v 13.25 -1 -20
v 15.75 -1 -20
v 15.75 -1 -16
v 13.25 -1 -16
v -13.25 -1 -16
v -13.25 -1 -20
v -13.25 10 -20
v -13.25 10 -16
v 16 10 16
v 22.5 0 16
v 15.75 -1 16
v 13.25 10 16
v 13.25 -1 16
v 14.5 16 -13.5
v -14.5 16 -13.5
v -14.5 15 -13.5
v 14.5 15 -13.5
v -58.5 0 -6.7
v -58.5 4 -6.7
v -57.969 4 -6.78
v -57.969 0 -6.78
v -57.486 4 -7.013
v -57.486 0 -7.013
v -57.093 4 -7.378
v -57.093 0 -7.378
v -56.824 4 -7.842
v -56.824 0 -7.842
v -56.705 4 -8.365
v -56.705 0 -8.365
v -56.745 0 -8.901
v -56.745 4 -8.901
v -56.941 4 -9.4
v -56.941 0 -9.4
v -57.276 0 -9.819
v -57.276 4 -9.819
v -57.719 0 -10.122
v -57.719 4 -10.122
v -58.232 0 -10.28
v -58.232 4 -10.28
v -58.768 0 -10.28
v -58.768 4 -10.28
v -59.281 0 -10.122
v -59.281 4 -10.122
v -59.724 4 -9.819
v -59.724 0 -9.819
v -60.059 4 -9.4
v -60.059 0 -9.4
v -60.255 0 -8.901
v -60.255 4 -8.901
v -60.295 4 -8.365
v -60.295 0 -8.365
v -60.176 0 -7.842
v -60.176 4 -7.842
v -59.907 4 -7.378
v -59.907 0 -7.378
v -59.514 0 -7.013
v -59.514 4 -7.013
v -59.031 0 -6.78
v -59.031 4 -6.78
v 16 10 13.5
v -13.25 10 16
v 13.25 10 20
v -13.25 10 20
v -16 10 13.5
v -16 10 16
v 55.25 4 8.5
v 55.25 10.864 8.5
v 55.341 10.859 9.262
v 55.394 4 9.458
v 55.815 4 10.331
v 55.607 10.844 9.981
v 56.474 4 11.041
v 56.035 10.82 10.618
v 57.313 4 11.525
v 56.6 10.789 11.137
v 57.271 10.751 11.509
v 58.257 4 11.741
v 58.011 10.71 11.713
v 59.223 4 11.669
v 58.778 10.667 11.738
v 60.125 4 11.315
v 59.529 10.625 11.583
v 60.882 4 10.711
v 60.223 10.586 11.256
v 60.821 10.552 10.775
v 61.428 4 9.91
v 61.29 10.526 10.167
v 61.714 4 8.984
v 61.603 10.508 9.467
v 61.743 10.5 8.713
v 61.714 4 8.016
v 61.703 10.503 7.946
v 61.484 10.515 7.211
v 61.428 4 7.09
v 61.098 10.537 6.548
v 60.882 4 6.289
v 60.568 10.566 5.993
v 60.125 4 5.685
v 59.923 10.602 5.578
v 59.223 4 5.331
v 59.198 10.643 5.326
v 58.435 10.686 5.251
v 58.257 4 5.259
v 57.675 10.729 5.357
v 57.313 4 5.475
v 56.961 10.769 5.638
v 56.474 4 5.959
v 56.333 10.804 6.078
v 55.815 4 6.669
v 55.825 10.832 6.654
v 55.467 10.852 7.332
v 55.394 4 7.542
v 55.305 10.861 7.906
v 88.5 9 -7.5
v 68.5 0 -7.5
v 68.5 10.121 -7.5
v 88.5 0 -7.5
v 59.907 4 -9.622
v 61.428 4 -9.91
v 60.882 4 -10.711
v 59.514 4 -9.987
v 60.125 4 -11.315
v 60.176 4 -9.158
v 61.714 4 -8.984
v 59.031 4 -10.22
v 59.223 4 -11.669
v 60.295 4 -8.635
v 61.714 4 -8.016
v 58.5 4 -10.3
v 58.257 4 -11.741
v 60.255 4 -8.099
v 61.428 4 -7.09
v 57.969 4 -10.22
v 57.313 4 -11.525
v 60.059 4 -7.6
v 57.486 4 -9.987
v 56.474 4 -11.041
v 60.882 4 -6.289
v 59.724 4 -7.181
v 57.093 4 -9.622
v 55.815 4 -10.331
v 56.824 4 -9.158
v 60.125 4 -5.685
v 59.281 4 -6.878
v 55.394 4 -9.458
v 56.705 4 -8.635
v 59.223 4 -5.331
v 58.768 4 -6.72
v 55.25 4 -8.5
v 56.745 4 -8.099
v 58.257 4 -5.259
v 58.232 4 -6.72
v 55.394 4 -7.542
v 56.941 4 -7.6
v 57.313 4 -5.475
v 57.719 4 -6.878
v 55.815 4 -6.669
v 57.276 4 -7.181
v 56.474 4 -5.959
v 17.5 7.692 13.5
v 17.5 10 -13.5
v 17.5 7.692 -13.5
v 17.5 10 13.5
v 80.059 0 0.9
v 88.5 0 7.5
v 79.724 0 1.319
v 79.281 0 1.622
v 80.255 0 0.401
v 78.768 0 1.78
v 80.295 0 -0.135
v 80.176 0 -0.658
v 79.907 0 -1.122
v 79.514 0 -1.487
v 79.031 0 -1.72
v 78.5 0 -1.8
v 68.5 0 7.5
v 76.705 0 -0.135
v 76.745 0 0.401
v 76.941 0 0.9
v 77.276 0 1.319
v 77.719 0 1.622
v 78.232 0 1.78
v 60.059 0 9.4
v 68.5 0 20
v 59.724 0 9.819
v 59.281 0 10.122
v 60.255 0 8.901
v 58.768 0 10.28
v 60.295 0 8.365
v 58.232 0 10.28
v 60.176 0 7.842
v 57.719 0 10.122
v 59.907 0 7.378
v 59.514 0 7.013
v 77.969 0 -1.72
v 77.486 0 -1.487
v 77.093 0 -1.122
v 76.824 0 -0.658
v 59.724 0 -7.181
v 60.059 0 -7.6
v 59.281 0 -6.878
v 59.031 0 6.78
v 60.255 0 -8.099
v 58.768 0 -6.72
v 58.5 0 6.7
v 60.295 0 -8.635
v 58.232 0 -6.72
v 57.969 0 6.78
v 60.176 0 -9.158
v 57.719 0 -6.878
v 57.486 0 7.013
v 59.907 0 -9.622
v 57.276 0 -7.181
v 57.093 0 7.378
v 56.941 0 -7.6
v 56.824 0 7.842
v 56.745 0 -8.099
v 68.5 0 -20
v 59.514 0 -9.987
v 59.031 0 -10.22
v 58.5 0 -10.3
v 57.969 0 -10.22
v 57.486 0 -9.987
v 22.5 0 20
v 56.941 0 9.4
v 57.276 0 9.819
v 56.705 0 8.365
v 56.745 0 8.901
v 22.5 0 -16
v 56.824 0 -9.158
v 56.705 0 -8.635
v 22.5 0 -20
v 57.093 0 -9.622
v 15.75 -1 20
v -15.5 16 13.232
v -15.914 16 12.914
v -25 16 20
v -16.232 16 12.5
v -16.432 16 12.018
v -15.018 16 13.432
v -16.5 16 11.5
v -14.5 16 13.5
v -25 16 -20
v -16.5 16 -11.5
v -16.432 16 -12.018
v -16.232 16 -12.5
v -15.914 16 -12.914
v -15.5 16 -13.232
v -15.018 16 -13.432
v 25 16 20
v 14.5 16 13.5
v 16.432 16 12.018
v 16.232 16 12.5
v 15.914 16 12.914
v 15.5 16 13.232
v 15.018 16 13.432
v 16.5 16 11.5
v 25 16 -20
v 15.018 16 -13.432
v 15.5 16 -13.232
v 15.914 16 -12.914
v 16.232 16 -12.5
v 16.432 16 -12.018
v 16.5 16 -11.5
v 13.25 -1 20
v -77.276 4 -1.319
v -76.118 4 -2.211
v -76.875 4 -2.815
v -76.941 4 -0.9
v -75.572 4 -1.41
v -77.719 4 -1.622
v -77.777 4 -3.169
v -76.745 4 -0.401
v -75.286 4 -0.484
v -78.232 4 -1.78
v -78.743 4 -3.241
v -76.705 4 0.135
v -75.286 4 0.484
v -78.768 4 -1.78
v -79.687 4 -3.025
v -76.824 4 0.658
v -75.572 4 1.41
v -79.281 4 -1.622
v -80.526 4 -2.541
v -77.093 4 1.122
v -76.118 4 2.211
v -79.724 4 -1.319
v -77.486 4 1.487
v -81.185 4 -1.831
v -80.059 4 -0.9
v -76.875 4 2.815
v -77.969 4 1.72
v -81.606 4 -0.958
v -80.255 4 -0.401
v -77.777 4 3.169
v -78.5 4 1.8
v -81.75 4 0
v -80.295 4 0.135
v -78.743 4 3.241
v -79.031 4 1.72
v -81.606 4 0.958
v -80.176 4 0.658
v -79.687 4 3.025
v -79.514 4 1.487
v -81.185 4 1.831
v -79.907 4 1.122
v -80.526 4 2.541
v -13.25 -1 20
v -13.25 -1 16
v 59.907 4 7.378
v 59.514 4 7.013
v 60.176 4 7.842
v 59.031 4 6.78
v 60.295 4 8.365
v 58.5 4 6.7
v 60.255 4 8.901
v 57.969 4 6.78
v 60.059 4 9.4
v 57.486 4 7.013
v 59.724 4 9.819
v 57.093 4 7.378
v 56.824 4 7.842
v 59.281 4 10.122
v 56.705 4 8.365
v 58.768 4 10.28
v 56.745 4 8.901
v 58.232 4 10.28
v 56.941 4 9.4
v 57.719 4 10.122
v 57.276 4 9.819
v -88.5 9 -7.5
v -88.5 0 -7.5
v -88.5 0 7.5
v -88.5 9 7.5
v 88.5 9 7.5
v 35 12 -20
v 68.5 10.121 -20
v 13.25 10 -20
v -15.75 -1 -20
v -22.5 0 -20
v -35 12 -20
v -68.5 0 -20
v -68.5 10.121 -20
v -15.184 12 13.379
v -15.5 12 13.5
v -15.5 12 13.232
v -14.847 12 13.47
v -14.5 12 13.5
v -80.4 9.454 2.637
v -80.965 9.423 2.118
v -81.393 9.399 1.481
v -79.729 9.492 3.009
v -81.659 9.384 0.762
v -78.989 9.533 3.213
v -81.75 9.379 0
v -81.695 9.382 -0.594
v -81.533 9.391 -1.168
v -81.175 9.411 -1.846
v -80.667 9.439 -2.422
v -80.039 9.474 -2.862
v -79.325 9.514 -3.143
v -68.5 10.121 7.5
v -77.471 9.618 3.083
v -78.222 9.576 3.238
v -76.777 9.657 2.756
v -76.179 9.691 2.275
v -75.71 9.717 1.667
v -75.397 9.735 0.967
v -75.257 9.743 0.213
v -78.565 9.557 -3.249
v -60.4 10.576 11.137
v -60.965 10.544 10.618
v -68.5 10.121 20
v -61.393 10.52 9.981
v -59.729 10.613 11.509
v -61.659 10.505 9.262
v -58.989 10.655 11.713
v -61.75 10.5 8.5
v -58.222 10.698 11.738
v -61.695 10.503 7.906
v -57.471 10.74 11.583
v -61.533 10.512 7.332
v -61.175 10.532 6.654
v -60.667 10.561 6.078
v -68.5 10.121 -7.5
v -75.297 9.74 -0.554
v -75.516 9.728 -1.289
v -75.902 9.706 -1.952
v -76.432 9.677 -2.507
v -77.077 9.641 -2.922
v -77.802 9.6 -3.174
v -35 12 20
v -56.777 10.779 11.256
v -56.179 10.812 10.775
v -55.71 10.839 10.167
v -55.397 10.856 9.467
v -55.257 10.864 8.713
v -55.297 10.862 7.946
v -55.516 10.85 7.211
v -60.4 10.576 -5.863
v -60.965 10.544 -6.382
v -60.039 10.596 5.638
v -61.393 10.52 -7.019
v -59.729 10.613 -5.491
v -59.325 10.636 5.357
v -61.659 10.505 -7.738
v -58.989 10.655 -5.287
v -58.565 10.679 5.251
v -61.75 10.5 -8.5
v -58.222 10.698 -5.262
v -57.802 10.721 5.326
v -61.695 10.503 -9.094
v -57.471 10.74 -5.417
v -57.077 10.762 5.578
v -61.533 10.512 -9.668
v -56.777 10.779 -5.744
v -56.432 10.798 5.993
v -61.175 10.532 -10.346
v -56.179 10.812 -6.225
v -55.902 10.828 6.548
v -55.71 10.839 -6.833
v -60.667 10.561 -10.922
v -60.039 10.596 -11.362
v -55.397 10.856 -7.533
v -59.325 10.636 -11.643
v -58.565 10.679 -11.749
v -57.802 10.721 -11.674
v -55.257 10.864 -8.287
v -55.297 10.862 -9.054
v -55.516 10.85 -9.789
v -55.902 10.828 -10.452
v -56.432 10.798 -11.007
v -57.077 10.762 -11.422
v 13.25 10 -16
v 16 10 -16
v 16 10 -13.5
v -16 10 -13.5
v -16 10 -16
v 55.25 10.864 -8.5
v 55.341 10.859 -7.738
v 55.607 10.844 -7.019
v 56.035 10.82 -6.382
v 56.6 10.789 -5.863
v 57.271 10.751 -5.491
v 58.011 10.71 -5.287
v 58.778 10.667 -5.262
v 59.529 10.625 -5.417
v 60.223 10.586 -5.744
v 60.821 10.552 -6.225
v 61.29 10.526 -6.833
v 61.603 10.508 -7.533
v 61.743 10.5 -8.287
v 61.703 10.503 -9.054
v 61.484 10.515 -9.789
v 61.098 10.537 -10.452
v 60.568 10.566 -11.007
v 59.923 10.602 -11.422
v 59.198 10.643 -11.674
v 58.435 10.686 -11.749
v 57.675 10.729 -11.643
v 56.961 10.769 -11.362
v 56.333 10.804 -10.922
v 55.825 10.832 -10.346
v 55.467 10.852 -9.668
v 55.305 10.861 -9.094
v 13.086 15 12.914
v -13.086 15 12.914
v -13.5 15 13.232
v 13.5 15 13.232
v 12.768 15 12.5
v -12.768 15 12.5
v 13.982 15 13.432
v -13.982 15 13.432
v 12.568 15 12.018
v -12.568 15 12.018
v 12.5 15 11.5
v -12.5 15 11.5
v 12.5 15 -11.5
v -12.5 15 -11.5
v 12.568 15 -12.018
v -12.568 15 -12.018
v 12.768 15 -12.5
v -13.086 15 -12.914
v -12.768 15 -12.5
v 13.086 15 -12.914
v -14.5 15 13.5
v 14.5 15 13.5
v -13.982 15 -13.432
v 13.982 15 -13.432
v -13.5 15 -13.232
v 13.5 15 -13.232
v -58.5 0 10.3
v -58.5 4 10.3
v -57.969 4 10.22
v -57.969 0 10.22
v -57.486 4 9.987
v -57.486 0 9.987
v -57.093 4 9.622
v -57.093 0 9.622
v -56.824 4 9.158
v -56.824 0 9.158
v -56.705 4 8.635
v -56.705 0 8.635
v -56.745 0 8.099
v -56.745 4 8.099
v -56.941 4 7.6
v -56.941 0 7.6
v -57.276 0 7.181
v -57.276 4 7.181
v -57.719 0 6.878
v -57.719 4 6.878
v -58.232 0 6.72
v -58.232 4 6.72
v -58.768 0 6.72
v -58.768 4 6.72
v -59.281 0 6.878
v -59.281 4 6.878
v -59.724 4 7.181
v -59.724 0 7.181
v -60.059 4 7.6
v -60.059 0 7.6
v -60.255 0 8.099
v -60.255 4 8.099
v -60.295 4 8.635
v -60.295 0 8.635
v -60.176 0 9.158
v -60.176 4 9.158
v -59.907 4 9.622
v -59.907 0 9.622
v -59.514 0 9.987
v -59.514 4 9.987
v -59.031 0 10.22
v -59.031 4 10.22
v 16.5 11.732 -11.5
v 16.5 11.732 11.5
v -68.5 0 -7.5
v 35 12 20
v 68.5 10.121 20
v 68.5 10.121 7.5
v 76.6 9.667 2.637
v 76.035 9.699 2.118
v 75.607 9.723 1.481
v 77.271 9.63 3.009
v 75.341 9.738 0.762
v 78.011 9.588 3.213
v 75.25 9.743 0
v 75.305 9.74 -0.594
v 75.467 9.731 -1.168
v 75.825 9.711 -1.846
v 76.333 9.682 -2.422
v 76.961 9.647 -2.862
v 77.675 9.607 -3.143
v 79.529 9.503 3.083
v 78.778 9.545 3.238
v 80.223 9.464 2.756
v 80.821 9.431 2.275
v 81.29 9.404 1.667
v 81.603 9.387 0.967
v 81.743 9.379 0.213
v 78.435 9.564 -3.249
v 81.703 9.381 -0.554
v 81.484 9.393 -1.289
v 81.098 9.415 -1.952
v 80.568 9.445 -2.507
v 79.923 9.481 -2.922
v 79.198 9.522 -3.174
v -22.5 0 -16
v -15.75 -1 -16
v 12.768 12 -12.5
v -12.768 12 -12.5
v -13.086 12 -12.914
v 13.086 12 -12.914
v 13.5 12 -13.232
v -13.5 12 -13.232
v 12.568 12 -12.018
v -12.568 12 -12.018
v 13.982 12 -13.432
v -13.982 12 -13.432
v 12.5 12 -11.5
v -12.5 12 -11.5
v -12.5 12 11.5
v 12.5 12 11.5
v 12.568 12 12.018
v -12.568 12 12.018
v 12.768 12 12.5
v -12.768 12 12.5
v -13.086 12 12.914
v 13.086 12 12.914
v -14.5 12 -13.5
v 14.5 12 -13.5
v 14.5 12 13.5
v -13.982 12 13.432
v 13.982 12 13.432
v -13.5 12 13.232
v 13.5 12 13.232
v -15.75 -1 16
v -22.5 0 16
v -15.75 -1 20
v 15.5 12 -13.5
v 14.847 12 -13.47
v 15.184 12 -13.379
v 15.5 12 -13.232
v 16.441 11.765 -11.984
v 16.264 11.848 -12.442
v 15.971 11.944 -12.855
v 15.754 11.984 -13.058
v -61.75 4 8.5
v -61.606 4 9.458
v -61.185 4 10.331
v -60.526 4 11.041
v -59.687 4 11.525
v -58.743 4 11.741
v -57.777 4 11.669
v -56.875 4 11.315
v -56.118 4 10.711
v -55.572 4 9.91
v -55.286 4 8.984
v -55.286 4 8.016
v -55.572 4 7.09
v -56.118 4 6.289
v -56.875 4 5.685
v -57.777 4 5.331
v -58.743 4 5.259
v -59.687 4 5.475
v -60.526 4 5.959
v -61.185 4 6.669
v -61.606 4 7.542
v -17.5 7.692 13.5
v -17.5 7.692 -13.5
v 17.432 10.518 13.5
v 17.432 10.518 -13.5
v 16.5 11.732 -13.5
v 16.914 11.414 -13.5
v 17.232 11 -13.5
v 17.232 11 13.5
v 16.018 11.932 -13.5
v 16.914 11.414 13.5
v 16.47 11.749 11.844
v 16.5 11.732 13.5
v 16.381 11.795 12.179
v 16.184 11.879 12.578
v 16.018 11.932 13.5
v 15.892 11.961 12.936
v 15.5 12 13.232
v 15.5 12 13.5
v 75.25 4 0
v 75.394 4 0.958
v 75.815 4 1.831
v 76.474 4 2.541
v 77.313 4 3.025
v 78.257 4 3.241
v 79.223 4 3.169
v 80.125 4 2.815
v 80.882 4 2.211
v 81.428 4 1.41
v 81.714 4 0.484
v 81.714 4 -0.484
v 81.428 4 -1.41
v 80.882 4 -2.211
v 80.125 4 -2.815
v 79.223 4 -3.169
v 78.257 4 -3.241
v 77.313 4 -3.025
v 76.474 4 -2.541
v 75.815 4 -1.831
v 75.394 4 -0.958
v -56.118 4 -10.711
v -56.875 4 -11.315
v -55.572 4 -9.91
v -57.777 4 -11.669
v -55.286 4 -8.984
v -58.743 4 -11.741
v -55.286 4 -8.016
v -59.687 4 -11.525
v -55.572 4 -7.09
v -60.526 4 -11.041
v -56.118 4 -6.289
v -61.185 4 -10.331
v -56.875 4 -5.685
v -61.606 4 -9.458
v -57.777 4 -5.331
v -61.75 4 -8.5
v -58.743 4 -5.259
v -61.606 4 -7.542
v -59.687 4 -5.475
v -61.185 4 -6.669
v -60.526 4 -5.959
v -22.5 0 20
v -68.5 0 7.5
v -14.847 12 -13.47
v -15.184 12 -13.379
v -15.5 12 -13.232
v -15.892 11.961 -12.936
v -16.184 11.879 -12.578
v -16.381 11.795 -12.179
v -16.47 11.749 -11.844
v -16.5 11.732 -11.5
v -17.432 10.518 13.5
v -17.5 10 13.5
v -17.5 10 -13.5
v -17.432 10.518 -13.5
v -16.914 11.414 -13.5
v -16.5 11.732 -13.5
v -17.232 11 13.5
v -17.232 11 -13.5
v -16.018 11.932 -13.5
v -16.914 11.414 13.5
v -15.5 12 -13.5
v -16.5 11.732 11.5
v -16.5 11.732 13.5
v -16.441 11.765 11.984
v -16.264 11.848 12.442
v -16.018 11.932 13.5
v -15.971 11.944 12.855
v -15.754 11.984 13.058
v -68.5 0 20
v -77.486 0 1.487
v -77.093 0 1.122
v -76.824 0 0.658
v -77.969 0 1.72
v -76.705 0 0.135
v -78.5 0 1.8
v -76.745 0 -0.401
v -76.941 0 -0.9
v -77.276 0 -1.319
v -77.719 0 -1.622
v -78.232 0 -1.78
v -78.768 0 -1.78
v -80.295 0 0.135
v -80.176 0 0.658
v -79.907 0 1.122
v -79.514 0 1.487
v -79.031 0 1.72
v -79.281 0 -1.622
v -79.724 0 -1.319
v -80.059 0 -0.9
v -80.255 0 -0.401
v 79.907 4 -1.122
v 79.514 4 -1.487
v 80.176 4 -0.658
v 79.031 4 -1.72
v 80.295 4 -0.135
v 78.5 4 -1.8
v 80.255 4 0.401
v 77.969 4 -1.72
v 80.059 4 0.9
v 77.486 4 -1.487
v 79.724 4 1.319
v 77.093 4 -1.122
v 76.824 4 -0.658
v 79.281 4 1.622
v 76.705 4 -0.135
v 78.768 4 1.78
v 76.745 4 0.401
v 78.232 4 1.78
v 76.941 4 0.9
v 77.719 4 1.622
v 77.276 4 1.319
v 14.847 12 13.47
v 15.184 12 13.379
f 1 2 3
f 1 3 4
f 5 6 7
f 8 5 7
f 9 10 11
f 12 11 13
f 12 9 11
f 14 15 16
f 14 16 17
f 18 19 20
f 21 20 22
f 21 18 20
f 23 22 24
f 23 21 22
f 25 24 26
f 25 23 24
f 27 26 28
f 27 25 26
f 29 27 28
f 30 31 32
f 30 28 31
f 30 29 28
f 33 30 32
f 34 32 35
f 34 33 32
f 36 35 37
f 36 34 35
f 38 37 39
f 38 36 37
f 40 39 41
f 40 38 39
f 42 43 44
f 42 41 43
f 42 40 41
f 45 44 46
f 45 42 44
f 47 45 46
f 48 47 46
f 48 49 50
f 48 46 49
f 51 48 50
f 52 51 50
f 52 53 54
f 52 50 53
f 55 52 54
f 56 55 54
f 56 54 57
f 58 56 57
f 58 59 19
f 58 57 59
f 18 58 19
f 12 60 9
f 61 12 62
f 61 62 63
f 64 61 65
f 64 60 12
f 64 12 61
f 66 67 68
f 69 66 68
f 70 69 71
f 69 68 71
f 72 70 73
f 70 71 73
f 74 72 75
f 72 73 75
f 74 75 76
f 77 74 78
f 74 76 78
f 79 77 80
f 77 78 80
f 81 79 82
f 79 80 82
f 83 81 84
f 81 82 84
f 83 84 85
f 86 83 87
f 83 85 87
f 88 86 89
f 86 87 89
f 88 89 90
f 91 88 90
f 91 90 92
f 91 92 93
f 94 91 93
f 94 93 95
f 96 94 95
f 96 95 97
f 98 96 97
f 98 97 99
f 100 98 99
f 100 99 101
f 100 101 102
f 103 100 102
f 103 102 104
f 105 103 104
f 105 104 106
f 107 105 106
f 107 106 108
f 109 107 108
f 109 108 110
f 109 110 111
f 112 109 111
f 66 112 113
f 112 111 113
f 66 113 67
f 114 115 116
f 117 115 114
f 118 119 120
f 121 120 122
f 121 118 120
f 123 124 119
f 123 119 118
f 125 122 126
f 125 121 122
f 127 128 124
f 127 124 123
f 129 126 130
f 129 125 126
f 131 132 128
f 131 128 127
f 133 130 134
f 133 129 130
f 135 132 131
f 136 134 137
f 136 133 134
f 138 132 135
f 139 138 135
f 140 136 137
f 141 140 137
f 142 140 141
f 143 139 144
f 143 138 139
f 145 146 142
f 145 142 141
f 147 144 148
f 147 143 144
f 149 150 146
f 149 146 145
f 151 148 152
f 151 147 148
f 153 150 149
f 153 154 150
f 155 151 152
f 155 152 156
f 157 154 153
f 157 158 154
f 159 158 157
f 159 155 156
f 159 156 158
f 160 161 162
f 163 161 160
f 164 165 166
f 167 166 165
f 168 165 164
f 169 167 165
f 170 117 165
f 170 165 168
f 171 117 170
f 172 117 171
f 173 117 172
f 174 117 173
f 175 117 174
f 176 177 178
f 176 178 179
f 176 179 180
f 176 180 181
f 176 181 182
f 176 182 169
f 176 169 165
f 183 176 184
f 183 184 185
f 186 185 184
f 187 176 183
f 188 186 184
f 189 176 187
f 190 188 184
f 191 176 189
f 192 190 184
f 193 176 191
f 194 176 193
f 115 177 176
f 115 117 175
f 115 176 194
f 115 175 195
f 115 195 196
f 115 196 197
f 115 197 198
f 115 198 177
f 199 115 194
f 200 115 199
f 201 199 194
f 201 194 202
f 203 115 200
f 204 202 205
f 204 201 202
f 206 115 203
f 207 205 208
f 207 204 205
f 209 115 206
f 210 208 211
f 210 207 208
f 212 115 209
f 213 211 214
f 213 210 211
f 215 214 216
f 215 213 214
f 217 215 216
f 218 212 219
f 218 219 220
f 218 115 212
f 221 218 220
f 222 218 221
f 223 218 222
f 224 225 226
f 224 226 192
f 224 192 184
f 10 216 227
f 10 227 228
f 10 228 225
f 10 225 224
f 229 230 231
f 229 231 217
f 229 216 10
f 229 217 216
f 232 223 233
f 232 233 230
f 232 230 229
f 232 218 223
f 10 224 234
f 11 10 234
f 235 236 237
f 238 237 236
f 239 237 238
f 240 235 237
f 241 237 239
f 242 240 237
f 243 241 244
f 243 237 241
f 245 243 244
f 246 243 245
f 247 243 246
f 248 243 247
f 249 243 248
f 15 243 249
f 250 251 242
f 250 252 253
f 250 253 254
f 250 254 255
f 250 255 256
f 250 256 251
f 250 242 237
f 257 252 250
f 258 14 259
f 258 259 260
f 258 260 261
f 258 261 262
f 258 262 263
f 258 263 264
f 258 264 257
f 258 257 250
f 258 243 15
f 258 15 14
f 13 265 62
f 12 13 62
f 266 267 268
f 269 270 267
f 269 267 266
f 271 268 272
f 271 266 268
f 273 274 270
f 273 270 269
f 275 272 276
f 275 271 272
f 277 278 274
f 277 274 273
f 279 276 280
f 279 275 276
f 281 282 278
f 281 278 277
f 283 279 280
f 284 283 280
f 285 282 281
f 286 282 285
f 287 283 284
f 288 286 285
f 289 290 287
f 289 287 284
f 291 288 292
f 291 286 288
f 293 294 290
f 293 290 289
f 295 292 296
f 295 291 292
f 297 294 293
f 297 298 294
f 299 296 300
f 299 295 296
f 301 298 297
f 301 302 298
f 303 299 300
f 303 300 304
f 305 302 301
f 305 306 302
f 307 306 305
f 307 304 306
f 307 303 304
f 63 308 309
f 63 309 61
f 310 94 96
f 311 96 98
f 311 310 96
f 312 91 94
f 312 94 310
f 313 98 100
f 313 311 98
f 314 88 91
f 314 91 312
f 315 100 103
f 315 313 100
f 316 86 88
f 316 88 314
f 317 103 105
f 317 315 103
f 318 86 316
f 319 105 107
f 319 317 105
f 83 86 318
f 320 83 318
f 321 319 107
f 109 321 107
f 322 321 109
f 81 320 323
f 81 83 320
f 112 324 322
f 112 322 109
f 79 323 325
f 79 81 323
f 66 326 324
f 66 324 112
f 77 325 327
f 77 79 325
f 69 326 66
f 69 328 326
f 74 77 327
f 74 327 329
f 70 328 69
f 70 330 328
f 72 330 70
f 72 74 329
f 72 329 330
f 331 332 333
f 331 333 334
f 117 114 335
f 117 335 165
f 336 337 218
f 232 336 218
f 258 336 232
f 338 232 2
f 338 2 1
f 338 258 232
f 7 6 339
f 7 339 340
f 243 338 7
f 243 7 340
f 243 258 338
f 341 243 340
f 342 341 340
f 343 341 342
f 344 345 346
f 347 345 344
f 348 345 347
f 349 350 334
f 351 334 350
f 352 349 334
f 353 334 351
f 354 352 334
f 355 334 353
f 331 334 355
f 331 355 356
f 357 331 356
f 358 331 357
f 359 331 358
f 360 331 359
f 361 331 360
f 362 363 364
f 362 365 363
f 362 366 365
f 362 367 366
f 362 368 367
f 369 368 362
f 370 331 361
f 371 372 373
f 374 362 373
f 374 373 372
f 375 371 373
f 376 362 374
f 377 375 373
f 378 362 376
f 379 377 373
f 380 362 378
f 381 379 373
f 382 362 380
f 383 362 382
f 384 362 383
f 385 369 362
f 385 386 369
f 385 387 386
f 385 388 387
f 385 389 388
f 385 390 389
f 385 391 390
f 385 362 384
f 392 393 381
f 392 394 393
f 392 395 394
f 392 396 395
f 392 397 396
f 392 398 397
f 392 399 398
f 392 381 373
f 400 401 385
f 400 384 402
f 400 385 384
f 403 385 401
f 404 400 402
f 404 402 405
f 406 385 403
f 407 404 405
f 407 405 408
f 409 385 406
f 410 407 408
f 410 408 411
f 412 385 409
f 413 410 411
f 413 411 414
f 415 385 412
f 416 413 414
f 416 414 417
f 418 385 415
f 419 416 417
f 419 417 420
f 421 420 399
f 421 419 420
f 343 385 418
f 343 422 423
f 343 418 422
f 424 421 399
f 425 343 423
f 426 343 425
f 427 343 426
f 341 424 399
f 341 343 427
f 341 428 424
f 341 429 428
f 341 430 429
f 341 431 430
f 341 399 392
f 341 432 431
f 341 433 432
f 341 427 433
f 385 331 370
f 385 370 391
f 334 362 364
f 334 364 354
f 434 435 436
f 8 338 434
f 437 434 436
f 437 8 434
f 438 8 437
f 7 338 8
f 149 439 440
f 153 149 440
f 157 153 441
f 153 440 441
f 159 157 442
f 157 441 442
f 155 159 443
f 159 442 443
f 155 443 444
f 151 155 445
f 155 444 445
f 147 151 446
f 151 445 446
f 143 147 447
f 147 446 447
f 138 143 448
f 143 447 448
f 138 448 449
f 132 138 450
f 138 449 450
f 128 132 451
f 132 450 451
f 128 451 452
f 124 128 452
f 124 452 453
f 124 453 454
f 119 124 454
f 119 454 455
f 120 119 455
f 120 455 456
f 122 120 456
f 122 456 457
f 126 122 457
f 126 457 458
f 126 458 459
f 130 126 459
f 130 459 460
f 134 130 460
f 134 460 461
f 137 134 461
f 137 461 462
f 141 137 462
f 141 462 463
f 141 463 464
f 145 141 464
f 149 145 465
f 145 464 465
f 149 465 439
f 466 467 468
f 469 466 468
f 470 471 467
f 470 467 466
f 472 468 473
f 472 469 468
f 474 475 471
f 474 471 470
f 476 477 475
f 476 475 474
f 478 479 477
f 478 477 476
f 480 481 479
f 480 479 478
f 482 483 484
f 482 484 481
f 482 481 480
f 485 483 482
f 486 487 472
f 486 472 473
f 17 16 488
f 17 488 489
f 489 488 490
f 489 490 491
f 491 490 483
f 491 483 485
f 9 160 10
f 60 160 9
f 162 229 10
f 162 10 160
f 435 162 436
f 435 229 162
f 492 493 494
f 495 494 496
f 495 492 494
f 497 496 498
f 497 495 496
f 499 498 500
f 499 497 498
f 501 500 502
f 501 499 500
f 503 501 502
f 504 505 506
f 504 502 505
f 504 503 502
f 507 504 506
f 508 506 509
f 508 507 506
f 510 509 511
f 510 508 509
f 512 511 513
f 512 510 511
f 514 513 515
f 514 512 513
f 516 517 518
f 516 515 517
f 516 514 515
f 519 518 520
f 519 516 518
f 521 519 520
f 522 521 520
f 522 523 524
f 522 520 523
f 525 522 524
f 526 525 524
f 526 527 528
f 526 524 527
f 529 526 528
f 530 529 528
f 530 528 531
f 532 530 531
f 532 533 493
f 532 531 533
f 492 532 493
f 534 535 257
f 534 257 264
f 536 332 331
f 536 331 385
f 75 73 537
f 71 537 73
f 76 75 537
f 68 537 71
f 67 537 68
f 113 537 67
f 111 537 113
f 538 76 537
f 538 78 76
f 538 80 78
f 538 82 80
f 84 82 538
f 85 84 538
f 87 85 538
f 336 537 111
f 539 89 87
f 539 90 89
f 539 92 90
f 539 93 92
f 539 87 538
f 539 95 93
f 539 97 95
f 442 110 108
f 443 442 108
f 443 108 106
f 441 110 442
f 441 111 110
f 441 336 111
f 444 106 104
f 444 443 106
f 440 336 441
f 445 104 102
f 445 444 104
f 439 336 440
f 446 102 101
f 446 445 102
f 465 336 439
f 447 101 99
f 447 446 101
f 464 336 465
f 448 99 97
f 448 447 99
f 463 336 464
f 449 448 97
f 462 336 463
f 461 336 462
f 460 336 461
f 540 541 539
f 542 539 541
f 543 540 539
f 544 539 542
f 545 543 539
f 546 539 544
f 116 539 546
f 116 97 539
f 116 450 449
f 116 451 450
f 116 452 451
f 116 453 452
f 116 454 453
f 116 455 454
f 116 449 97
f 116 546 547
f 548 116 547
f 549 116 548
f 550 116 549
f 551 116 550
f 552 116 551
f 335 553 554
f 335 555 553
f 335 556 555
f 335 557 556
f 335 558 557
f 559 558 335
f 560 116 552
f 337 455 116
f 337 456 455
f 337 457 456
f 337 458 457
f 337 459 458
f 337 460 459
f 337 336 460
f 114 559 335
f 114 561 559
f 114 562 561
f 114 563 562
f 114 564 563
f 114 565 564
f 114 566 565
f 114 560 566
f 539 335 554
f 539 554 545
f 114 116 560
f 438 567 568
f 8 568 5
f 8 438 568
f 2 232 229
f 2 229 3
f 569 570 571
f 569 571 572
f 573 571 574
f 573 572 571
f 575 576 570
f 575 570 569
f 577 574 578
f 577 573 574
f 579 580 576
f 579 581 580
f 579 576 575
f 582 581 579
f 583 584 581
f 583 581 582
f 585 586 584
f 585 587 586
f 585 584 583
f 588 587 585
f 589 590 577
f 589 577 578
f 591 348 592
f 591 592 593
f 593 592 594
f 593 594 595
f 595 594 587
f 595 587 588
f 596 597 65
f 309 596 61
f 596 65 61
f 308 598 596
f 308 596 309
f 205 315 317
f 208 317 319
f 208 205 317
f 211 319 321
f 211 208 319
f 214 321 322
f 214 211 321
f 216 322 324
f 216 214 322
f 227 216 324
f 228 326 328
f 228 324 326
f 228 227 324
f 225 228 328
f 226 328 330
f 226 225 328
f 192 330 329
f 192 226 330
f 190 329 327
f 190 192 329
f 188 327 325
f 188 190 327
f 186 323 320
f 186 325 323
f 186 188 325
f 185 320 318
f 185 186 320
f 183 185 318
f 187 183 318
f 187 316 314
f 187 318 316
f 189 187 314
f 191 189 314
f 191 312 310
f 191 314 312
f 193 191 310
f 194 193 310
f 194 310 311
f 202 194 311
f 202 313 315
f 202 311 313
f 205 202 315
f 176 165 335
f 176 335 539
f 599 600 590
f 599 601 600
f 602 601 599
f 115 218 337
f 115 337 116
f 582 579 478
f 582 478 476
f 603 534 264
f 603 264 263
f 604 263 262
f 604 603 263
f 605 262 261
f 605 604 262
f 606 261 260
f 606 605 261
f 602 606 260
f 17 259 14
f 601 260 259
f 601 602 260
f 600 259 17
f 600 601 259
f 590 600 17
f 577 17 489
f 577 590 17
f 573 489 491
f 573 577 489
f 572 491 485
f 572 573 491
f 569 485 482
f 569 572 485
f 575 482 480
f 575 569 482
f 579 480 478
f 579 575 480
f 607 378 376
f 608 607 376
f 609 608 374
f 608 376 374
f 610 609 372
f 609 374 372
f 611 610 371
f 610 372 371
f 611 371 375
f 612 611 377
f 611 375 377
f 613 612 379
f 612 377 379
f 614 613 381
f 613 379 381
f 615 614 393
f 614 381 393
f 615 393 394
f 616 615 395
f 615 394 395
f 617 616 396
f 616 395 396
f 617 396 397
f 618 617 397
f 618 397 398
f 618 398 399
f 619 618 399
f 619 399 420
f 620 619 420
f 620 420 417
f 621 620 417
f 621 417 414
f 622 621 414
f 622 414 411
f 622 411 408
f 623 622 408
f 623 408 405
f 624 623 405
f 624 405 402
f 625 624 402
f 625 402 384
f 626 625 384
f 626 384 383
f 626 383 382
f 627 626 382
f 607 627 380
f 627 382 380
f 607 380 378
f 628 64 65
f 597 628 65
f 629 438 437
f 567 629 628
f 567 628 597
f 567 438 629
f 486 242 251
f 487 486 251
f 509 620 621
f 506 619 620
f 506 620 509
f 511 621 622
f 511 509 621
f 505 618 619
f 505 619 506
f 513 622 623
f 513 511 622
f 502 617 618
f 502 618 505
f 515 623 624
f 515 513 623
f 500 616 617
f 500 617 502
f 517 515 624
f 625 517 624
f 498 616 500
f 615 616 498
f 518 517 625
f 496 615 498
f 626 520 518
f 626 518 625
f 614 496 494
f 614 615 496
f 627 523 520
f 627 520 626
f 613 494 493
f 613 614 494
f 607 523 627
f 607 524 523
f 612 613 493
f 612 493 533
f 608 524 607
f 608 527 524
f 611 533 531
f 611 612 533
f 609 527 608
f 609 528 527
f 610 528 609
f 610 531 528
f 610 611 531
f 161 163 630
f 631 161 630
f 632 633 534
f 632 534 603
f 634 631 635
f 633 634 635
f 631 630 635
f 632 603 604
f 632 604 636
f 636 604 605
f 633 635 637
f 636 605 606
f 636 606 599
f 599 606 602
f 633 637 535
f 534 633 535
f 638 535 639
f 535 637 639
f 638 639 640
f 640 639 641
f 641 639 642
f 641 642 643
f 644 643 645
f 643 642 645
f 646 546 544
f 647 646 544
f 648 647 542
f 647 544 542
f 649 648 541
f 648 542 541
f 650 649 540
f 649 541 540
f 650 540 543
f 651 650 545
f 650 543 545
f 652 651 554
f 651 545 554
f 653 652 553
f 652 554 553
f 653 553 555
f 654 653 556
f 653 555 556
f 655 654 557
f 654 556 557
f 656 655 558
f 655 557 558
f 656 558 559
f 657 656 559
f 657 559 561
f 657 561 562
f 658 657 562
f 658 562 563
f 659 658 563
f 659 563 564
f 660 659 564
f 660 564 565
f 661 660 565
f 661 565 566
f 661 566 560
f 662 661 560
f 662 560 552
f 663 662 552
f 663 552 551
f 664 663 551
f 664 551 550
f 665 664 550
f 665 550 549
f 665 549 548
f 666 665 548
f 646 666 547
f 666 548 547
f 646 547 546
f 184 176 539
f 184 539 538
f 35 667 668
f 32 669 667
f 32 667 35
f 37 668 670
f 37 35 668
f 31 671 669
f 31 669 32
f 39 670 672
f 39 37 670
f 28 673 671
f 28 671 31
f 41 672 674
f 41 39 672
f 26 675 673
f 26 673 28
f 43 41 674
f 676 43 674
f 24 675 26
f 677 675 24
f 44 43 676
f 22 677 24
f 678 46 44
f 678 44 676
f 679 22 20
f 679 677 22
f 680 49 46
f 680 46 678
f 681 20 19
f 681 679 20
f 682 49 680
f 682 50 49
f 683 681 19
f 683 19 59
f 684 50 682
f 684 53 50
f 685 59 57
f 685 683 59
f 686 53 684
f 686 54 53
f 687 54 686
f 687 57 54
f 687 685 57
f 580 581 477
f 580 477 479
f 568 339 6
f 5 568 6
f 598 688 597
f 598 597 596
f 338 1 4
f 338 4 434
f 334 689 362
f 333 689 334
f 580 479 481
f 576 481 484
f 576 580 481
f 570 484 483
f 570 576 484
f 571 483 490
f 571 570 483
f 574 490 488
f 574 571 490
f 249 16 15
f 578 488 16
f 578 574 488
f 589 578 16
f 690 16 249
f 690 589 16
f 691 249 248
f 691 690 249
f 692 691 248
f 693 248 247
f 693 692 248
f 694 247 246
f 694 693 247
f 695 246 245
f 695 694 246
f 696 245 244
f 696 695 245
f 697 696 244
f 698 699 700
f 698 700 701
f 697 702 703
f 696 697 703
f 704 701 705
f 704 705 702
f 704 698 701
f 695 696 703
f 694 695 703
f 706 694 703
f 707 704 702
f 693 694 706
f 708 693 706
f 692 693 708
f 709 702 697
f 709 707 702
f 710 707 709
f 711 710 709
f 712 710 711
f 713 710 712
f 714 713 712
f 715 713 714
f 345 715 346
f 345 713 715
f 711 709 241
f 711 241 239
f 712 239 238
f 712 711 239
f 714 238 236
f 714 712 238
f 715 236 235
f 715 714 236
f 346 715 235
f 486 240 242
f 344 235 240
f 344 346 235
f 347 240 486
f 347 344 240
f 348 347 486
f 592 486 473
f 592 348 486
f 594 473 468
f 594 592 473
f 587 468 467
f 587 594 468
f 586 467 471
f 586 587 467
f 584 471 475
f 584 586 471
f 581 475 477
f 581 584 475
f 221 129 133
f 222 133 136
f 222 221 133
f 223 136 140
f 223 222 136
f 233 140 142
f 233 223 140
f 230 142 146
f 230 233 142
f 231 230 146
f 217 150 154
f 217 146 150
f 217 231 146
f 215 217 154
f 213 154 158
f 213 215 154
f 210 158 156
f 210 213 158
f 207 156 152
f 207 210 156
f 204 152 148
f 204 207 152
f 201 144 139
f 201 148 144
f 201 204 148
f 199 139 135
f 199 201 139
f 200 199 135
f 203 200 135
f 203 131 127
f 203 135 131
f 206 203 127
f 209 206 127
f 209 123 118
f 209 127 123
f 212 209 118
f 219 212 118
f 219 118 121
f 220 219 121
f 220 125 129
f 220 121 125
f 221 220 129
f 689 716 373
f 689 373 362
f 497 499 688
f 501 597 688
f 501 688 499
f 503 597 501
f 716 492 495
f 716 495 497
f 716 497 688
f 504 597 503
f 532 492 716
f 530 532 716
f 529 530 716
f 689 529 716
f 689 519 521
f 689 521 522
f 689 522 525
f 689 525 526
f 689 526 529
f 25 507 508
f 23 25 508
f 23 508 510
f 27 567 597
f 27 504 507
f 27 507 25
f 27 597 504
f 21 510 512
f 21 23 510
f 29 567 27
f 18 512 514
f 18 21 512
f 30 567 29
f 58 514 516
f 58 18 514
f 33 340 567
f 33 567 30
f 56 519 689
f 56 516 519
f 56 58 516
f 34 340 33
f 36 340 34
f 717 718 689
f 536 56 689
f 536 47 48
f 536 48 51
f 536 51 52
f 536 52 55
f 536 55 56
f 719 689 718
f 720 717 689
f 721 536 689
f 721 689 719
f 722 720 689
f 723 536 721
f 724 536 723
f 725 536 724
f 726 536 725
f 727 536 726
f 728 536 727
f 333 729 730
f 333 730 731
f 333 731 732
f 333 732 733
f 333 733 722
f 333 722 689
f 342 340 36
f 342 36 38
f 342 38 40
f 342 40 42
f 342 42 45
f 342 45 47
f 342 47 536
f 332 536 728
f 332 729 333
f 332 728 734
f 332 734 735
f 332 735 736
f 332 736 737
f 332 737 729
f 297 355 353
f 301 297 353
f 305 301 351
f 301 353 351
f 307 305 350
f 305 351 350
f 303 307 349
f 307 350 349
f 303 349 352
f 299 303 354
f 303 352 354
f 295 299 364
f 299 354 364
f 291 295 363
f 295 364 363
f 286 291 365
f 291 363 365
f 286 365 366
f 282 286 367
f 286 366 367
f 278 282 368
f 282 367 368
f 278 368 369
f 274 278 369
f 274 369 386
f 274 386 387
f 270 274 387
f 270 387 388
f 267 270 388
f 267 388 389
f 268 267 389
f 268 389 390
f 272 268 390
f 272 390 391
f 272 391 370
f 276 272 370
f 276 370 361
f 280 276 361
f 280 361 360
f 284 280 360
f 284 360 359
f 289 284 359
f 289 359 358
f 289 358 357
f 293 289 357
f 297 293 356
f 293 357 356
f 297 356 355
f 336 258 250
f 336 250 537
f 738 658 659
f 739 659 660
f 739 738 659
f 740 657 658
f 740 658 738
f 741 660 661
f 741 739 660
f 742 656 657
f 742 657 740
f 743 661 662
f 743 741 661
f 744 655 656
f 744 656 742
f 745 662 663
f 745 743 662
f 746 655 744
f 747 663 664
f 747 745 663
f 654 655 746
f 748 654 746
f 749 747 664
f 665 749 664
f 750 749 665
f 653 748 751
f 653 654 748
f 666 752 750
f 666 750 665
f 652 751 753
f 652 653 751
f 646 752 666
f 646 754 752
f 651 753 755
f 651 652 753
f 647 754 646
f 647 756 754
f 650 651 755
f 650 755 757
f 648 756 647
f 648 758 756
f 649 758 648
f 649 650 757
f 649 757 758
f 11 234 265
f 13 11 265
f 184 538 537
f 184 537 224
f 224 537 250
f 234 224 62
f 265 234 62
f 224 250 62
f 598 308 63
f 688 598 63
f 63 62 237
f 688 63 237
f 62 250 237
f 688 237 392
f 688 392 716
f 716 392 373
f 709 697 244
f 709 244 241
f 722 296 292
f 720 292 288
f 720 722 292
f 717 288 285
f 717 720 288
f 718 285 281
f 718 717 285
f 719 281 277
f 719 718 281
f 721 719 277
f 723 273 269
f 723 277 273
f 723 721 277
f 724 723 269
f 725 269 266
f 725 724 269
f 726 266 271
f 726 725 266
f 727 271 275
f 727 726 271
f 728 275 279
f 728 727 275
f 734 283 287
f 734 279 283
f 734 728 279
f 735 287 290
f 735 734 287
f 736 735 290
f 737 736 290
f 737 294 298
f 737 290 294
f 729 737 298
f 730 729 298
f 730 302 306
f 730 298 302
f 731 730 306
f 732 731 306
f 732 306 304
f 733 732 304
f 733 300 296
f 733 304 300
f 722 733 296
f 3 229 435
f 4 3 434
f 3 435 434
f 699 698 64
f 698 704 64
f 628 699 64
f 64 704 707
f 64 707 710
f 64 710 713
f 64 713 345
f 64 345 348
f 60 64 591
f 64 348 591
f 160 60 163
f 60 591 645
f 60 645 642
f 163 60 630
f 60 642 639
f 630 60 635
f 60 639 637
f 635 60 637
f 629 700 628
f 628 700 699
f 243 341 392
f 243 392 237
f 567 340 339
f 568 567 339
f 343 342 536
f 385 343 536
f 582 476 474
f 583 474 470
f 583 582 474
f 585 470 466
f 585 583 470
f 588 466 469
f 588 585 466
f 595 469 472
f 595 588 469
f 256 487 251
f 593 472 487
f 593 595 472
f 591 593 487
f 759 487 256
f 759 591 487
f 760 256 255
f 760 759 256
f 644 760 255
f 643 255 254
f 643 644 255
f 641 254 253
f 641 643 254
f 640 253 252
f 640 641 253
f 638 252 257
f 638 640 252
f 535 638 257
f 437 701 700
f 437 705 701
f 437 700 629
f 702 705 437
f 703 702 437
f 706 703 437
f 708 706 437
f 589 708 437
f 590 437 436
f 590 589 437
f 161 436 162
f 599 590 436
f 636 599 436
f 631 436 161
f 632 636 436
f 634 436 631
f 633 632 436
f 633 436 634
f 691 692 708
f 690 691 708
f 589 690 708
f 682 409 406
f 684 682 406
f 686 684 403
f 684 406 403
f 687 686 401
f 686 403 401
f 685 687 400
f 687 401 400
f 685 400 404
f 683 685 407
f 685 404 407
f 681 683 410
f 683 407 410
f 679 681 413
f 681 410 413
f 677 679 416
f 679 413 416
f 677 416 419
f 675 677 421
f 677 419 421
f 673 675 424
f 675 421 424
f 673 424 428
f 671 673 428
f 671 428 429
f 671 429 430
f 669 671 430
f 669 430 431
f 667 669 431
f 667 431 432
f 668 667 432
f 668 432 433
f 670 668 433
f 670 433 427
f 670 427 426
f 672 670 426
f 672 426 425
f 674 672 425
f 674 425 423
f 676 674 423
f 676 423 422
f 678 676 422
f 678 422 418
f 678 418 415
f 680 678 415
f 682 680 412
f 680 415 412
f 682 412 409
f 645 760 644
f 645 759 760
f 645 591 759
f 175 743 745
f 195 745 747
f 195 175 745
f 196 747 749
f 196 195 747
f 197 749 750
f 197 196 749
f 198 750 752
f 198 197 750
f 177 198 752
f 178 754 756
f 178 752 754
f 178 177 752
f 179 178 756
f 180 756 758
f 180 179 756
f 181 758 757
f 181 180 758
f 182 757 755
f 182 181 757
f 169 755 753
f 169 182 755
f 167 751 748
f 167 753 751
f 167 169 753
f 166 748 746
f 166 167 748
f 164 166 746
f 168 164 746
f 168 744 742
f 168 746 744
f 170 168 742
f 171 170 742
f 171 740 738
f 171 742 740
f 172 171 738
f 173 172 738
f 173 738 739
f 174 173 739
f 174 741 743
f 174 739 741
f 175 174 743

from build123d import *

# Parameters (mm, degrees)
SKETCH1_R                      = 1.8
BOSS_EXTRUDE1_DEPTH            = 6
BOSS_EXTRUDE2_DEPTH            = 40
CUT_EXTRUDE1_REACH             = 93.281
SKETCH3_W                      = 20
SKETCH3_H                      = 12.5
SKETCH4_R                      = 3.25
CUT_EXTRUDE2_DEPTH             = 12
CUT_EXTRUDE3_REACH             = 100.429
CUT_EXTRUDE4_START             = -2
SKETCH6_W                      = 35
SKETCH6_H                      = 27
CUT_EXTRUDE4_DEPTH             = 4.307692
FILLET1_R                      = 2
BOSS_EXTRUDE3_DEPTH            = 4
CUT_EXTRUDE5_REACH             = 93.658
CUT_EXTRUDE5_DIRECTION_2_REACH = 93.658
SKETCH10_W                     = 29
SKETCH10_H                     = 27
CUT_EXTRUDE7_DEPTH             = 1


with BuildPart() as part:
    # Sketch1 → Boss-Extrude1 (new body)
    with BuildSketch(Plane(origin=(0, 0, 0), x_dir=(1, 0, 0), z_dir=(0, 1, 0))):
        Polygon((68.5, 20), (68.5, 7.5), (88.5, 7.5), (88.5, -7.5), (68.5, -7.5), (68.5, -20), (-68.5, -20), (-68.5, -7.5), (-88.5, -7.5), (-88.5, 7.5), (-68.5, 7.5), (-68.5, 20), align=None)
        with Locations(Location((-78.5, 0, 0), (0, 0, 270))):
            Circle(SKETCH1_R, mode=Mode.SUBTRACT)
        with Locations(Location((-58.5, 8.5, 0), (0, 0, 270))):
            Circle(SKETCH1_R, mode=Mode.SUBTRACT)
        with Locations(Location((-58.5, -8.5, 0), (0, 0, 270))):
            Circle(SKETCH1_R, mode=Mode.SUBTRACT)
        with Locations(Location((58.5, -8.5, 0), (0, 0, 90))):
            Circle(SKETCH1_R, mode=Mode.SUBTRACT)
        with Locations(Location((78.5, 0, 0), (0, 0, 90))):
            Circle(SKETCH1_R, mode=Mode.SUBTRACT)
        with Locations(Location((58.5, 8.5, 0), (0, 0, 90))):
            Circle(SKETCH1_R, mode=Mode.SUBTRACT)
    extrude(amount=BOSS_EXTRUDE1_DEPTH)

    # Sketch2 → Boss-Extrude2 (add)
    with BuildSketch(Plane(origin=(0, 0, -20), x_dir=(-1, 0, 0), z_dir=(0, 0, -1))):
        Polygon((-88.5, 6), (88.5, 6), (88.5, 9), (35, 12), (25, 16), (-25, 16), (-35, 12), (-88.5, 9), align=None)
    extrude(amount=-BOSS_EXTRUDE2_DEPTH)

    # Sketch3 → Cut-Extrude1 (cut, up to next)
    with BuildSketch(Plane.XZ.offset(-6), mode=Mode.PRIVATE) as cut_extrude1_sk1:
        with Locations((-78.5, 13.75)):
            Rectangle(SKETCH3_W, SKETCH3_H)
    cut_extrude1_tool1 = extrude(cut_extrude1_sk1.sketch, amount=-CUT_EXTRUDE1_REACH, mode=Mode.PRIVATE) & part.part
    # Sketch3 → Cut-Extrude1 (cut, up to next)
    with BuildSketch(Plane.XZ.offset(-6), mode=Mode.PRIVATE) as cut_extrude1_sk2:
        with Locations((-78.5, -13.75)):
            Rectangle(SKETCH3_W, SKETCH3_H)
    cut_extrude1_tool2 = extrude(cut_extrude1_sk2.sketch, amount=-CUT_EXTRUDE1_REACH, mode=Mode.PRIVATE) & part.part
    # Sketch3 → Cut-Extrude1 (cut, up to next)
    with BuildSketch(Plane.XZ.offset(-6), mode=Mode.PRIVATE) as cut_extrude1_sk3:
        with Locations((78.5, 13.75)):
            Rectangle(SKETCH3_W, SKETCH3_H)
    cut_extrude1_tool3 = extrude(cut_extrude1_sk3.sketch, amount=-CUT_EXTRUDE1_REACH, mode=Mode.PRIVATE) & part.part
    # Sketch3 → Cut-Extrude1 (cut, up to next)
    with BuildSketch(Plane.XZ.offset(-6), mode=Mode.PRIVATE) as cut_extrude1_sk4:
        with Locations((78.5, -13.75)):
            Rectangle(SKETCH3_W, SKETCH3_H)
    cut_extrude1_tool4 = extrude(cut_extrude1_sk4.sketch, amount=-CUT_EXTRUDE1_REACH, mode=Mode.PRIVATE) & part.part
    add(cut_extrude1_tool1.solids().sort_by_distance((-78.5, 6, 13.75))[0], mode=Mode.SUBTRACT)
    add(cut_extrude1_tool2.solids().sort_by_distance((-78.5, 6, -13.75))[0], mode=Mode.SUBTRACT)
    add(cut_extrude1_tool3.solids().sort_by_distance((78.5, 6, 13.75))[0], mode=Mode.SUBTRACT)
    add(cut_extrude1_tool4.solids().sort_by_distance((78.5, 6, -13.75))[0], mode=Mode.SUBTRACT)

    # Sketch4 → Cut-Extrude2 (cut)
    with BuildSketch(Plane(origin=(0, 16, 0), x_dir=(1, 0, 0), z_dir=(0, 1, 0))):
        with Locations(Location((-58.5, 8.5, 0), (0, 0, 180))):
            Circle(SKETCH4_R)
        with Locations(Location((-78.5, 0, 0), (0, 0, 180))):
            Circle(SKETCH4_R)
        with Locations(Location((-58.5, -8.5, 0), (0, 0, 180))):
            Circle(SKETCH4_R)
        with Locations(Location((58.5, 8.5, 0), (0, 0, 180))):
            Circle(SKETCH4_R)
        with Locations(Location((58.5, -8.5, 0), (0, 0, 180))):
            Circle(SKETCH4_R)
        with Locations(Location((78.5, 0, 0), (0, 0, 180))):
            Circle(SKETCH4_R)
    extrude(amount=-CUT_EXTRUDE2_DEPTH, mode=Mode.SUBTRACT)

    # Sketch5 → Cut-Extrude3 (cut, up to next)
    with BuildSketch(Plane(origin=(0, 0, -20), x_dir=(-1, 0, 0), z_dir=(0, 0, -1)), mode=Mode.PRIVATE) as cut_extrude3_sk1:
        Polygon((-22.5, 0), (-16, 10), (16, 10), (22.5, 0), align=None)
    cut_extrude3_tool1 = extrude(cut_extrude3_sk1.sketch, amount=-CUT_EXTRUDE3_REACH, mode=Mode.PRIVATE) & part.part
    add(cut_extrude3_tool1.solids().sort_by_distance((0, 4.718615, -20))[0], mode=Mode.SUBTRACT)

    # Sketch6 → Cut-Extrude4 (cut)
    with BuildSketch(Plane.XZ.offset(-10).offset(CUT_EXTRUDE4_START)):
        Rectangle(SKETCH6_W, SKETCH6_H)
    extrude(amount=CUT_EXTRUDE4_DEPTH, mode=Mode.SUBTRACT)

    # Fillet1
    fillet1_edges = [part.edges().sort_by_distance(p)[0] for p in [
        (-17.5, 12, 0),
        (17.5, 12, 0),
    ]]
    fillet(fillet1_edges, radius=FILLET1_R)

    # Sketch7 → Boss-Extrude3 (add)
    with BuildSketch(Plane(origin=(0, 0, -20), x_dir=(-1, 0, 0), z_dir=(0, 0, -1))):
        Polygon((-22.5, 0), (-15.75, -1), (-13.25, -1), (-13.25, 10), (-16, 10), align=None)
        Polygon((16, 10), (22.5, 0), (15.75, -1), (13.25, -1), (13.25, 10), align=None)
    boss_extrude3 = extrude(amount=-BOSS_EXTRUDE3_DEPTH)

    # Mirror1: Boss-Extrude3 across plane
    add(boss_extrude3.mirror(Plane.XY))

    # Sketch8 → Cut-Extrude5 (cut, up to next)
    with BuildSketch(Plane.XZ.offset(-12), mode=Mode.PRIVATE) as cut_extrude5_sk1:
        with BuildLine():
            Line((-12.5, 11.5), (-12.5, -11.5))
            ThreePointArc((-12.5, -11.5), (-14.5, -13.5), (-16.5, -11.5))
            Line((-16.5, -11.5), (-16.5, 11.5))
            ThreePointArc((-16.5, 11.5), (-14.5, 13.5), (-12.5, 11.5))
        make_face()
    cut_extrude5_tool1 = extrude(cut_extrude5_sk1.sketch, amount=-CUT_EXTRUDE5_REACH, mode=Mode.PRIVATE) & part.part
    # Sketch8 → Cut-Extrude5 (cut, up to next)
    with BuildSketch(Plane.XZ.offset(-12), mode=Mode.PRIVATE) as cut_extrude5_sk2:
        with BuildLine():
            Line((16.5, 11.5), (16.5, -11.5))
            ThreePointArc((16.5, -11.5), (14.5, -13.5), (12.5, -11.5))
            Line((12.5, -11.5), (12.5, 11.5))
            ThreePointArc((12.5, 11.5), (14.5, 13.5), (16.5, 11.5))
        make_face()
    cut_extrude5_tool2 = extrude(cut_extrude5_sk2.sketch, amount=-CUT_EXTRUDE5_REACH, mode=Mode.PRIVATE) & part.part
    add(cut_extrude5_tool1.solids().sort_by_distance((-14.5, 12, 0))[0], mode=Mode.SUBTRACT)
    add(cut_extrude5_tool2.solids().sort_by_distance((14.5, 12, 0))[0], mode=Mode.SUBTRACT)

    # Sketch8 → Cut-Extrude5 direction 2 (cut, up to next)
    with BuildSketch(Plane.XZ.offset(-12), mode=Mode.PRIVATE) as cut_extrude5_direction_2_sk1:
        with BuildLine():
            Line((-12.5, 11.5), (-12.5, -11.5))
            ThreePointArc((-12.5, -11.5), (-14.5, -13.5), (-16.5, -11.5))
            Line((-16.5, -11.5), (-16.5, 11.5))
            ThreePointArc((-16.5, 11.5), (-14.5, 13.5), (-12.5, 11.5))
        make_face()
    cut_extrude5_direction_2_tool1 = extrude(cut_extrude5_direction_2_sk1.sketch, amount=CUT_EXTRUDE5_DIRECTION_2_REACH, mode=Mode.PRIVATE) & part.part
    # Sketch8 → Cut-Extrude5 direction 2 (cut, up to next)
    with BuildSketch(Plane.XZ.offset(-12), mode=Mode.PRIVATE) as cut_extrude5_direction_2_sk2:
        with BuildLine():
            Line((16.5, 11.5), (16.5, -11.5))
            ThreePointArc((16.5, -11.5), (14.5, -13.5), (12.5, -11.5))
            Line((12.5, -11.5), (12.5, 11.5))
            ThreePointArc((12.5, 11.5), (14.5, 13.5), (16.5, 11.5))
        make_face()
    cut_extrude5_direction_2_tool2 = extrude(cut_extrude5_direction_2_sk2.sketch, amount=CUT_EXTRUDE5_DIRECTION_2_REACH, mode=Mode.PRIVATE) & part.part
    add(cut_extrude5_direction_2_tool1.solids().sort_by_distance((-14.5, 12, 0))[0], mode=Mode.SUBTRACT)
    add(cut_extrude5_direction_2_tool2.solids().sort_by_distance((14.5, 12, 0))[0], mode=Mode.SUBTRACT)

    # Sketch10 → Cut-Extrude7 (cut)
    with BuildSketch(Plane(origin=(0, 16, 0), x_dir=(1, 0, 0), z_dir=(0, 1, 0))):
        Rectangle(SKETCH10_W, SKETCH10_H)
    extrude(amount=-CUT_EXTRUDE7_DEPTH, mode=Mode.SUBTRACT)


solid = part.part
